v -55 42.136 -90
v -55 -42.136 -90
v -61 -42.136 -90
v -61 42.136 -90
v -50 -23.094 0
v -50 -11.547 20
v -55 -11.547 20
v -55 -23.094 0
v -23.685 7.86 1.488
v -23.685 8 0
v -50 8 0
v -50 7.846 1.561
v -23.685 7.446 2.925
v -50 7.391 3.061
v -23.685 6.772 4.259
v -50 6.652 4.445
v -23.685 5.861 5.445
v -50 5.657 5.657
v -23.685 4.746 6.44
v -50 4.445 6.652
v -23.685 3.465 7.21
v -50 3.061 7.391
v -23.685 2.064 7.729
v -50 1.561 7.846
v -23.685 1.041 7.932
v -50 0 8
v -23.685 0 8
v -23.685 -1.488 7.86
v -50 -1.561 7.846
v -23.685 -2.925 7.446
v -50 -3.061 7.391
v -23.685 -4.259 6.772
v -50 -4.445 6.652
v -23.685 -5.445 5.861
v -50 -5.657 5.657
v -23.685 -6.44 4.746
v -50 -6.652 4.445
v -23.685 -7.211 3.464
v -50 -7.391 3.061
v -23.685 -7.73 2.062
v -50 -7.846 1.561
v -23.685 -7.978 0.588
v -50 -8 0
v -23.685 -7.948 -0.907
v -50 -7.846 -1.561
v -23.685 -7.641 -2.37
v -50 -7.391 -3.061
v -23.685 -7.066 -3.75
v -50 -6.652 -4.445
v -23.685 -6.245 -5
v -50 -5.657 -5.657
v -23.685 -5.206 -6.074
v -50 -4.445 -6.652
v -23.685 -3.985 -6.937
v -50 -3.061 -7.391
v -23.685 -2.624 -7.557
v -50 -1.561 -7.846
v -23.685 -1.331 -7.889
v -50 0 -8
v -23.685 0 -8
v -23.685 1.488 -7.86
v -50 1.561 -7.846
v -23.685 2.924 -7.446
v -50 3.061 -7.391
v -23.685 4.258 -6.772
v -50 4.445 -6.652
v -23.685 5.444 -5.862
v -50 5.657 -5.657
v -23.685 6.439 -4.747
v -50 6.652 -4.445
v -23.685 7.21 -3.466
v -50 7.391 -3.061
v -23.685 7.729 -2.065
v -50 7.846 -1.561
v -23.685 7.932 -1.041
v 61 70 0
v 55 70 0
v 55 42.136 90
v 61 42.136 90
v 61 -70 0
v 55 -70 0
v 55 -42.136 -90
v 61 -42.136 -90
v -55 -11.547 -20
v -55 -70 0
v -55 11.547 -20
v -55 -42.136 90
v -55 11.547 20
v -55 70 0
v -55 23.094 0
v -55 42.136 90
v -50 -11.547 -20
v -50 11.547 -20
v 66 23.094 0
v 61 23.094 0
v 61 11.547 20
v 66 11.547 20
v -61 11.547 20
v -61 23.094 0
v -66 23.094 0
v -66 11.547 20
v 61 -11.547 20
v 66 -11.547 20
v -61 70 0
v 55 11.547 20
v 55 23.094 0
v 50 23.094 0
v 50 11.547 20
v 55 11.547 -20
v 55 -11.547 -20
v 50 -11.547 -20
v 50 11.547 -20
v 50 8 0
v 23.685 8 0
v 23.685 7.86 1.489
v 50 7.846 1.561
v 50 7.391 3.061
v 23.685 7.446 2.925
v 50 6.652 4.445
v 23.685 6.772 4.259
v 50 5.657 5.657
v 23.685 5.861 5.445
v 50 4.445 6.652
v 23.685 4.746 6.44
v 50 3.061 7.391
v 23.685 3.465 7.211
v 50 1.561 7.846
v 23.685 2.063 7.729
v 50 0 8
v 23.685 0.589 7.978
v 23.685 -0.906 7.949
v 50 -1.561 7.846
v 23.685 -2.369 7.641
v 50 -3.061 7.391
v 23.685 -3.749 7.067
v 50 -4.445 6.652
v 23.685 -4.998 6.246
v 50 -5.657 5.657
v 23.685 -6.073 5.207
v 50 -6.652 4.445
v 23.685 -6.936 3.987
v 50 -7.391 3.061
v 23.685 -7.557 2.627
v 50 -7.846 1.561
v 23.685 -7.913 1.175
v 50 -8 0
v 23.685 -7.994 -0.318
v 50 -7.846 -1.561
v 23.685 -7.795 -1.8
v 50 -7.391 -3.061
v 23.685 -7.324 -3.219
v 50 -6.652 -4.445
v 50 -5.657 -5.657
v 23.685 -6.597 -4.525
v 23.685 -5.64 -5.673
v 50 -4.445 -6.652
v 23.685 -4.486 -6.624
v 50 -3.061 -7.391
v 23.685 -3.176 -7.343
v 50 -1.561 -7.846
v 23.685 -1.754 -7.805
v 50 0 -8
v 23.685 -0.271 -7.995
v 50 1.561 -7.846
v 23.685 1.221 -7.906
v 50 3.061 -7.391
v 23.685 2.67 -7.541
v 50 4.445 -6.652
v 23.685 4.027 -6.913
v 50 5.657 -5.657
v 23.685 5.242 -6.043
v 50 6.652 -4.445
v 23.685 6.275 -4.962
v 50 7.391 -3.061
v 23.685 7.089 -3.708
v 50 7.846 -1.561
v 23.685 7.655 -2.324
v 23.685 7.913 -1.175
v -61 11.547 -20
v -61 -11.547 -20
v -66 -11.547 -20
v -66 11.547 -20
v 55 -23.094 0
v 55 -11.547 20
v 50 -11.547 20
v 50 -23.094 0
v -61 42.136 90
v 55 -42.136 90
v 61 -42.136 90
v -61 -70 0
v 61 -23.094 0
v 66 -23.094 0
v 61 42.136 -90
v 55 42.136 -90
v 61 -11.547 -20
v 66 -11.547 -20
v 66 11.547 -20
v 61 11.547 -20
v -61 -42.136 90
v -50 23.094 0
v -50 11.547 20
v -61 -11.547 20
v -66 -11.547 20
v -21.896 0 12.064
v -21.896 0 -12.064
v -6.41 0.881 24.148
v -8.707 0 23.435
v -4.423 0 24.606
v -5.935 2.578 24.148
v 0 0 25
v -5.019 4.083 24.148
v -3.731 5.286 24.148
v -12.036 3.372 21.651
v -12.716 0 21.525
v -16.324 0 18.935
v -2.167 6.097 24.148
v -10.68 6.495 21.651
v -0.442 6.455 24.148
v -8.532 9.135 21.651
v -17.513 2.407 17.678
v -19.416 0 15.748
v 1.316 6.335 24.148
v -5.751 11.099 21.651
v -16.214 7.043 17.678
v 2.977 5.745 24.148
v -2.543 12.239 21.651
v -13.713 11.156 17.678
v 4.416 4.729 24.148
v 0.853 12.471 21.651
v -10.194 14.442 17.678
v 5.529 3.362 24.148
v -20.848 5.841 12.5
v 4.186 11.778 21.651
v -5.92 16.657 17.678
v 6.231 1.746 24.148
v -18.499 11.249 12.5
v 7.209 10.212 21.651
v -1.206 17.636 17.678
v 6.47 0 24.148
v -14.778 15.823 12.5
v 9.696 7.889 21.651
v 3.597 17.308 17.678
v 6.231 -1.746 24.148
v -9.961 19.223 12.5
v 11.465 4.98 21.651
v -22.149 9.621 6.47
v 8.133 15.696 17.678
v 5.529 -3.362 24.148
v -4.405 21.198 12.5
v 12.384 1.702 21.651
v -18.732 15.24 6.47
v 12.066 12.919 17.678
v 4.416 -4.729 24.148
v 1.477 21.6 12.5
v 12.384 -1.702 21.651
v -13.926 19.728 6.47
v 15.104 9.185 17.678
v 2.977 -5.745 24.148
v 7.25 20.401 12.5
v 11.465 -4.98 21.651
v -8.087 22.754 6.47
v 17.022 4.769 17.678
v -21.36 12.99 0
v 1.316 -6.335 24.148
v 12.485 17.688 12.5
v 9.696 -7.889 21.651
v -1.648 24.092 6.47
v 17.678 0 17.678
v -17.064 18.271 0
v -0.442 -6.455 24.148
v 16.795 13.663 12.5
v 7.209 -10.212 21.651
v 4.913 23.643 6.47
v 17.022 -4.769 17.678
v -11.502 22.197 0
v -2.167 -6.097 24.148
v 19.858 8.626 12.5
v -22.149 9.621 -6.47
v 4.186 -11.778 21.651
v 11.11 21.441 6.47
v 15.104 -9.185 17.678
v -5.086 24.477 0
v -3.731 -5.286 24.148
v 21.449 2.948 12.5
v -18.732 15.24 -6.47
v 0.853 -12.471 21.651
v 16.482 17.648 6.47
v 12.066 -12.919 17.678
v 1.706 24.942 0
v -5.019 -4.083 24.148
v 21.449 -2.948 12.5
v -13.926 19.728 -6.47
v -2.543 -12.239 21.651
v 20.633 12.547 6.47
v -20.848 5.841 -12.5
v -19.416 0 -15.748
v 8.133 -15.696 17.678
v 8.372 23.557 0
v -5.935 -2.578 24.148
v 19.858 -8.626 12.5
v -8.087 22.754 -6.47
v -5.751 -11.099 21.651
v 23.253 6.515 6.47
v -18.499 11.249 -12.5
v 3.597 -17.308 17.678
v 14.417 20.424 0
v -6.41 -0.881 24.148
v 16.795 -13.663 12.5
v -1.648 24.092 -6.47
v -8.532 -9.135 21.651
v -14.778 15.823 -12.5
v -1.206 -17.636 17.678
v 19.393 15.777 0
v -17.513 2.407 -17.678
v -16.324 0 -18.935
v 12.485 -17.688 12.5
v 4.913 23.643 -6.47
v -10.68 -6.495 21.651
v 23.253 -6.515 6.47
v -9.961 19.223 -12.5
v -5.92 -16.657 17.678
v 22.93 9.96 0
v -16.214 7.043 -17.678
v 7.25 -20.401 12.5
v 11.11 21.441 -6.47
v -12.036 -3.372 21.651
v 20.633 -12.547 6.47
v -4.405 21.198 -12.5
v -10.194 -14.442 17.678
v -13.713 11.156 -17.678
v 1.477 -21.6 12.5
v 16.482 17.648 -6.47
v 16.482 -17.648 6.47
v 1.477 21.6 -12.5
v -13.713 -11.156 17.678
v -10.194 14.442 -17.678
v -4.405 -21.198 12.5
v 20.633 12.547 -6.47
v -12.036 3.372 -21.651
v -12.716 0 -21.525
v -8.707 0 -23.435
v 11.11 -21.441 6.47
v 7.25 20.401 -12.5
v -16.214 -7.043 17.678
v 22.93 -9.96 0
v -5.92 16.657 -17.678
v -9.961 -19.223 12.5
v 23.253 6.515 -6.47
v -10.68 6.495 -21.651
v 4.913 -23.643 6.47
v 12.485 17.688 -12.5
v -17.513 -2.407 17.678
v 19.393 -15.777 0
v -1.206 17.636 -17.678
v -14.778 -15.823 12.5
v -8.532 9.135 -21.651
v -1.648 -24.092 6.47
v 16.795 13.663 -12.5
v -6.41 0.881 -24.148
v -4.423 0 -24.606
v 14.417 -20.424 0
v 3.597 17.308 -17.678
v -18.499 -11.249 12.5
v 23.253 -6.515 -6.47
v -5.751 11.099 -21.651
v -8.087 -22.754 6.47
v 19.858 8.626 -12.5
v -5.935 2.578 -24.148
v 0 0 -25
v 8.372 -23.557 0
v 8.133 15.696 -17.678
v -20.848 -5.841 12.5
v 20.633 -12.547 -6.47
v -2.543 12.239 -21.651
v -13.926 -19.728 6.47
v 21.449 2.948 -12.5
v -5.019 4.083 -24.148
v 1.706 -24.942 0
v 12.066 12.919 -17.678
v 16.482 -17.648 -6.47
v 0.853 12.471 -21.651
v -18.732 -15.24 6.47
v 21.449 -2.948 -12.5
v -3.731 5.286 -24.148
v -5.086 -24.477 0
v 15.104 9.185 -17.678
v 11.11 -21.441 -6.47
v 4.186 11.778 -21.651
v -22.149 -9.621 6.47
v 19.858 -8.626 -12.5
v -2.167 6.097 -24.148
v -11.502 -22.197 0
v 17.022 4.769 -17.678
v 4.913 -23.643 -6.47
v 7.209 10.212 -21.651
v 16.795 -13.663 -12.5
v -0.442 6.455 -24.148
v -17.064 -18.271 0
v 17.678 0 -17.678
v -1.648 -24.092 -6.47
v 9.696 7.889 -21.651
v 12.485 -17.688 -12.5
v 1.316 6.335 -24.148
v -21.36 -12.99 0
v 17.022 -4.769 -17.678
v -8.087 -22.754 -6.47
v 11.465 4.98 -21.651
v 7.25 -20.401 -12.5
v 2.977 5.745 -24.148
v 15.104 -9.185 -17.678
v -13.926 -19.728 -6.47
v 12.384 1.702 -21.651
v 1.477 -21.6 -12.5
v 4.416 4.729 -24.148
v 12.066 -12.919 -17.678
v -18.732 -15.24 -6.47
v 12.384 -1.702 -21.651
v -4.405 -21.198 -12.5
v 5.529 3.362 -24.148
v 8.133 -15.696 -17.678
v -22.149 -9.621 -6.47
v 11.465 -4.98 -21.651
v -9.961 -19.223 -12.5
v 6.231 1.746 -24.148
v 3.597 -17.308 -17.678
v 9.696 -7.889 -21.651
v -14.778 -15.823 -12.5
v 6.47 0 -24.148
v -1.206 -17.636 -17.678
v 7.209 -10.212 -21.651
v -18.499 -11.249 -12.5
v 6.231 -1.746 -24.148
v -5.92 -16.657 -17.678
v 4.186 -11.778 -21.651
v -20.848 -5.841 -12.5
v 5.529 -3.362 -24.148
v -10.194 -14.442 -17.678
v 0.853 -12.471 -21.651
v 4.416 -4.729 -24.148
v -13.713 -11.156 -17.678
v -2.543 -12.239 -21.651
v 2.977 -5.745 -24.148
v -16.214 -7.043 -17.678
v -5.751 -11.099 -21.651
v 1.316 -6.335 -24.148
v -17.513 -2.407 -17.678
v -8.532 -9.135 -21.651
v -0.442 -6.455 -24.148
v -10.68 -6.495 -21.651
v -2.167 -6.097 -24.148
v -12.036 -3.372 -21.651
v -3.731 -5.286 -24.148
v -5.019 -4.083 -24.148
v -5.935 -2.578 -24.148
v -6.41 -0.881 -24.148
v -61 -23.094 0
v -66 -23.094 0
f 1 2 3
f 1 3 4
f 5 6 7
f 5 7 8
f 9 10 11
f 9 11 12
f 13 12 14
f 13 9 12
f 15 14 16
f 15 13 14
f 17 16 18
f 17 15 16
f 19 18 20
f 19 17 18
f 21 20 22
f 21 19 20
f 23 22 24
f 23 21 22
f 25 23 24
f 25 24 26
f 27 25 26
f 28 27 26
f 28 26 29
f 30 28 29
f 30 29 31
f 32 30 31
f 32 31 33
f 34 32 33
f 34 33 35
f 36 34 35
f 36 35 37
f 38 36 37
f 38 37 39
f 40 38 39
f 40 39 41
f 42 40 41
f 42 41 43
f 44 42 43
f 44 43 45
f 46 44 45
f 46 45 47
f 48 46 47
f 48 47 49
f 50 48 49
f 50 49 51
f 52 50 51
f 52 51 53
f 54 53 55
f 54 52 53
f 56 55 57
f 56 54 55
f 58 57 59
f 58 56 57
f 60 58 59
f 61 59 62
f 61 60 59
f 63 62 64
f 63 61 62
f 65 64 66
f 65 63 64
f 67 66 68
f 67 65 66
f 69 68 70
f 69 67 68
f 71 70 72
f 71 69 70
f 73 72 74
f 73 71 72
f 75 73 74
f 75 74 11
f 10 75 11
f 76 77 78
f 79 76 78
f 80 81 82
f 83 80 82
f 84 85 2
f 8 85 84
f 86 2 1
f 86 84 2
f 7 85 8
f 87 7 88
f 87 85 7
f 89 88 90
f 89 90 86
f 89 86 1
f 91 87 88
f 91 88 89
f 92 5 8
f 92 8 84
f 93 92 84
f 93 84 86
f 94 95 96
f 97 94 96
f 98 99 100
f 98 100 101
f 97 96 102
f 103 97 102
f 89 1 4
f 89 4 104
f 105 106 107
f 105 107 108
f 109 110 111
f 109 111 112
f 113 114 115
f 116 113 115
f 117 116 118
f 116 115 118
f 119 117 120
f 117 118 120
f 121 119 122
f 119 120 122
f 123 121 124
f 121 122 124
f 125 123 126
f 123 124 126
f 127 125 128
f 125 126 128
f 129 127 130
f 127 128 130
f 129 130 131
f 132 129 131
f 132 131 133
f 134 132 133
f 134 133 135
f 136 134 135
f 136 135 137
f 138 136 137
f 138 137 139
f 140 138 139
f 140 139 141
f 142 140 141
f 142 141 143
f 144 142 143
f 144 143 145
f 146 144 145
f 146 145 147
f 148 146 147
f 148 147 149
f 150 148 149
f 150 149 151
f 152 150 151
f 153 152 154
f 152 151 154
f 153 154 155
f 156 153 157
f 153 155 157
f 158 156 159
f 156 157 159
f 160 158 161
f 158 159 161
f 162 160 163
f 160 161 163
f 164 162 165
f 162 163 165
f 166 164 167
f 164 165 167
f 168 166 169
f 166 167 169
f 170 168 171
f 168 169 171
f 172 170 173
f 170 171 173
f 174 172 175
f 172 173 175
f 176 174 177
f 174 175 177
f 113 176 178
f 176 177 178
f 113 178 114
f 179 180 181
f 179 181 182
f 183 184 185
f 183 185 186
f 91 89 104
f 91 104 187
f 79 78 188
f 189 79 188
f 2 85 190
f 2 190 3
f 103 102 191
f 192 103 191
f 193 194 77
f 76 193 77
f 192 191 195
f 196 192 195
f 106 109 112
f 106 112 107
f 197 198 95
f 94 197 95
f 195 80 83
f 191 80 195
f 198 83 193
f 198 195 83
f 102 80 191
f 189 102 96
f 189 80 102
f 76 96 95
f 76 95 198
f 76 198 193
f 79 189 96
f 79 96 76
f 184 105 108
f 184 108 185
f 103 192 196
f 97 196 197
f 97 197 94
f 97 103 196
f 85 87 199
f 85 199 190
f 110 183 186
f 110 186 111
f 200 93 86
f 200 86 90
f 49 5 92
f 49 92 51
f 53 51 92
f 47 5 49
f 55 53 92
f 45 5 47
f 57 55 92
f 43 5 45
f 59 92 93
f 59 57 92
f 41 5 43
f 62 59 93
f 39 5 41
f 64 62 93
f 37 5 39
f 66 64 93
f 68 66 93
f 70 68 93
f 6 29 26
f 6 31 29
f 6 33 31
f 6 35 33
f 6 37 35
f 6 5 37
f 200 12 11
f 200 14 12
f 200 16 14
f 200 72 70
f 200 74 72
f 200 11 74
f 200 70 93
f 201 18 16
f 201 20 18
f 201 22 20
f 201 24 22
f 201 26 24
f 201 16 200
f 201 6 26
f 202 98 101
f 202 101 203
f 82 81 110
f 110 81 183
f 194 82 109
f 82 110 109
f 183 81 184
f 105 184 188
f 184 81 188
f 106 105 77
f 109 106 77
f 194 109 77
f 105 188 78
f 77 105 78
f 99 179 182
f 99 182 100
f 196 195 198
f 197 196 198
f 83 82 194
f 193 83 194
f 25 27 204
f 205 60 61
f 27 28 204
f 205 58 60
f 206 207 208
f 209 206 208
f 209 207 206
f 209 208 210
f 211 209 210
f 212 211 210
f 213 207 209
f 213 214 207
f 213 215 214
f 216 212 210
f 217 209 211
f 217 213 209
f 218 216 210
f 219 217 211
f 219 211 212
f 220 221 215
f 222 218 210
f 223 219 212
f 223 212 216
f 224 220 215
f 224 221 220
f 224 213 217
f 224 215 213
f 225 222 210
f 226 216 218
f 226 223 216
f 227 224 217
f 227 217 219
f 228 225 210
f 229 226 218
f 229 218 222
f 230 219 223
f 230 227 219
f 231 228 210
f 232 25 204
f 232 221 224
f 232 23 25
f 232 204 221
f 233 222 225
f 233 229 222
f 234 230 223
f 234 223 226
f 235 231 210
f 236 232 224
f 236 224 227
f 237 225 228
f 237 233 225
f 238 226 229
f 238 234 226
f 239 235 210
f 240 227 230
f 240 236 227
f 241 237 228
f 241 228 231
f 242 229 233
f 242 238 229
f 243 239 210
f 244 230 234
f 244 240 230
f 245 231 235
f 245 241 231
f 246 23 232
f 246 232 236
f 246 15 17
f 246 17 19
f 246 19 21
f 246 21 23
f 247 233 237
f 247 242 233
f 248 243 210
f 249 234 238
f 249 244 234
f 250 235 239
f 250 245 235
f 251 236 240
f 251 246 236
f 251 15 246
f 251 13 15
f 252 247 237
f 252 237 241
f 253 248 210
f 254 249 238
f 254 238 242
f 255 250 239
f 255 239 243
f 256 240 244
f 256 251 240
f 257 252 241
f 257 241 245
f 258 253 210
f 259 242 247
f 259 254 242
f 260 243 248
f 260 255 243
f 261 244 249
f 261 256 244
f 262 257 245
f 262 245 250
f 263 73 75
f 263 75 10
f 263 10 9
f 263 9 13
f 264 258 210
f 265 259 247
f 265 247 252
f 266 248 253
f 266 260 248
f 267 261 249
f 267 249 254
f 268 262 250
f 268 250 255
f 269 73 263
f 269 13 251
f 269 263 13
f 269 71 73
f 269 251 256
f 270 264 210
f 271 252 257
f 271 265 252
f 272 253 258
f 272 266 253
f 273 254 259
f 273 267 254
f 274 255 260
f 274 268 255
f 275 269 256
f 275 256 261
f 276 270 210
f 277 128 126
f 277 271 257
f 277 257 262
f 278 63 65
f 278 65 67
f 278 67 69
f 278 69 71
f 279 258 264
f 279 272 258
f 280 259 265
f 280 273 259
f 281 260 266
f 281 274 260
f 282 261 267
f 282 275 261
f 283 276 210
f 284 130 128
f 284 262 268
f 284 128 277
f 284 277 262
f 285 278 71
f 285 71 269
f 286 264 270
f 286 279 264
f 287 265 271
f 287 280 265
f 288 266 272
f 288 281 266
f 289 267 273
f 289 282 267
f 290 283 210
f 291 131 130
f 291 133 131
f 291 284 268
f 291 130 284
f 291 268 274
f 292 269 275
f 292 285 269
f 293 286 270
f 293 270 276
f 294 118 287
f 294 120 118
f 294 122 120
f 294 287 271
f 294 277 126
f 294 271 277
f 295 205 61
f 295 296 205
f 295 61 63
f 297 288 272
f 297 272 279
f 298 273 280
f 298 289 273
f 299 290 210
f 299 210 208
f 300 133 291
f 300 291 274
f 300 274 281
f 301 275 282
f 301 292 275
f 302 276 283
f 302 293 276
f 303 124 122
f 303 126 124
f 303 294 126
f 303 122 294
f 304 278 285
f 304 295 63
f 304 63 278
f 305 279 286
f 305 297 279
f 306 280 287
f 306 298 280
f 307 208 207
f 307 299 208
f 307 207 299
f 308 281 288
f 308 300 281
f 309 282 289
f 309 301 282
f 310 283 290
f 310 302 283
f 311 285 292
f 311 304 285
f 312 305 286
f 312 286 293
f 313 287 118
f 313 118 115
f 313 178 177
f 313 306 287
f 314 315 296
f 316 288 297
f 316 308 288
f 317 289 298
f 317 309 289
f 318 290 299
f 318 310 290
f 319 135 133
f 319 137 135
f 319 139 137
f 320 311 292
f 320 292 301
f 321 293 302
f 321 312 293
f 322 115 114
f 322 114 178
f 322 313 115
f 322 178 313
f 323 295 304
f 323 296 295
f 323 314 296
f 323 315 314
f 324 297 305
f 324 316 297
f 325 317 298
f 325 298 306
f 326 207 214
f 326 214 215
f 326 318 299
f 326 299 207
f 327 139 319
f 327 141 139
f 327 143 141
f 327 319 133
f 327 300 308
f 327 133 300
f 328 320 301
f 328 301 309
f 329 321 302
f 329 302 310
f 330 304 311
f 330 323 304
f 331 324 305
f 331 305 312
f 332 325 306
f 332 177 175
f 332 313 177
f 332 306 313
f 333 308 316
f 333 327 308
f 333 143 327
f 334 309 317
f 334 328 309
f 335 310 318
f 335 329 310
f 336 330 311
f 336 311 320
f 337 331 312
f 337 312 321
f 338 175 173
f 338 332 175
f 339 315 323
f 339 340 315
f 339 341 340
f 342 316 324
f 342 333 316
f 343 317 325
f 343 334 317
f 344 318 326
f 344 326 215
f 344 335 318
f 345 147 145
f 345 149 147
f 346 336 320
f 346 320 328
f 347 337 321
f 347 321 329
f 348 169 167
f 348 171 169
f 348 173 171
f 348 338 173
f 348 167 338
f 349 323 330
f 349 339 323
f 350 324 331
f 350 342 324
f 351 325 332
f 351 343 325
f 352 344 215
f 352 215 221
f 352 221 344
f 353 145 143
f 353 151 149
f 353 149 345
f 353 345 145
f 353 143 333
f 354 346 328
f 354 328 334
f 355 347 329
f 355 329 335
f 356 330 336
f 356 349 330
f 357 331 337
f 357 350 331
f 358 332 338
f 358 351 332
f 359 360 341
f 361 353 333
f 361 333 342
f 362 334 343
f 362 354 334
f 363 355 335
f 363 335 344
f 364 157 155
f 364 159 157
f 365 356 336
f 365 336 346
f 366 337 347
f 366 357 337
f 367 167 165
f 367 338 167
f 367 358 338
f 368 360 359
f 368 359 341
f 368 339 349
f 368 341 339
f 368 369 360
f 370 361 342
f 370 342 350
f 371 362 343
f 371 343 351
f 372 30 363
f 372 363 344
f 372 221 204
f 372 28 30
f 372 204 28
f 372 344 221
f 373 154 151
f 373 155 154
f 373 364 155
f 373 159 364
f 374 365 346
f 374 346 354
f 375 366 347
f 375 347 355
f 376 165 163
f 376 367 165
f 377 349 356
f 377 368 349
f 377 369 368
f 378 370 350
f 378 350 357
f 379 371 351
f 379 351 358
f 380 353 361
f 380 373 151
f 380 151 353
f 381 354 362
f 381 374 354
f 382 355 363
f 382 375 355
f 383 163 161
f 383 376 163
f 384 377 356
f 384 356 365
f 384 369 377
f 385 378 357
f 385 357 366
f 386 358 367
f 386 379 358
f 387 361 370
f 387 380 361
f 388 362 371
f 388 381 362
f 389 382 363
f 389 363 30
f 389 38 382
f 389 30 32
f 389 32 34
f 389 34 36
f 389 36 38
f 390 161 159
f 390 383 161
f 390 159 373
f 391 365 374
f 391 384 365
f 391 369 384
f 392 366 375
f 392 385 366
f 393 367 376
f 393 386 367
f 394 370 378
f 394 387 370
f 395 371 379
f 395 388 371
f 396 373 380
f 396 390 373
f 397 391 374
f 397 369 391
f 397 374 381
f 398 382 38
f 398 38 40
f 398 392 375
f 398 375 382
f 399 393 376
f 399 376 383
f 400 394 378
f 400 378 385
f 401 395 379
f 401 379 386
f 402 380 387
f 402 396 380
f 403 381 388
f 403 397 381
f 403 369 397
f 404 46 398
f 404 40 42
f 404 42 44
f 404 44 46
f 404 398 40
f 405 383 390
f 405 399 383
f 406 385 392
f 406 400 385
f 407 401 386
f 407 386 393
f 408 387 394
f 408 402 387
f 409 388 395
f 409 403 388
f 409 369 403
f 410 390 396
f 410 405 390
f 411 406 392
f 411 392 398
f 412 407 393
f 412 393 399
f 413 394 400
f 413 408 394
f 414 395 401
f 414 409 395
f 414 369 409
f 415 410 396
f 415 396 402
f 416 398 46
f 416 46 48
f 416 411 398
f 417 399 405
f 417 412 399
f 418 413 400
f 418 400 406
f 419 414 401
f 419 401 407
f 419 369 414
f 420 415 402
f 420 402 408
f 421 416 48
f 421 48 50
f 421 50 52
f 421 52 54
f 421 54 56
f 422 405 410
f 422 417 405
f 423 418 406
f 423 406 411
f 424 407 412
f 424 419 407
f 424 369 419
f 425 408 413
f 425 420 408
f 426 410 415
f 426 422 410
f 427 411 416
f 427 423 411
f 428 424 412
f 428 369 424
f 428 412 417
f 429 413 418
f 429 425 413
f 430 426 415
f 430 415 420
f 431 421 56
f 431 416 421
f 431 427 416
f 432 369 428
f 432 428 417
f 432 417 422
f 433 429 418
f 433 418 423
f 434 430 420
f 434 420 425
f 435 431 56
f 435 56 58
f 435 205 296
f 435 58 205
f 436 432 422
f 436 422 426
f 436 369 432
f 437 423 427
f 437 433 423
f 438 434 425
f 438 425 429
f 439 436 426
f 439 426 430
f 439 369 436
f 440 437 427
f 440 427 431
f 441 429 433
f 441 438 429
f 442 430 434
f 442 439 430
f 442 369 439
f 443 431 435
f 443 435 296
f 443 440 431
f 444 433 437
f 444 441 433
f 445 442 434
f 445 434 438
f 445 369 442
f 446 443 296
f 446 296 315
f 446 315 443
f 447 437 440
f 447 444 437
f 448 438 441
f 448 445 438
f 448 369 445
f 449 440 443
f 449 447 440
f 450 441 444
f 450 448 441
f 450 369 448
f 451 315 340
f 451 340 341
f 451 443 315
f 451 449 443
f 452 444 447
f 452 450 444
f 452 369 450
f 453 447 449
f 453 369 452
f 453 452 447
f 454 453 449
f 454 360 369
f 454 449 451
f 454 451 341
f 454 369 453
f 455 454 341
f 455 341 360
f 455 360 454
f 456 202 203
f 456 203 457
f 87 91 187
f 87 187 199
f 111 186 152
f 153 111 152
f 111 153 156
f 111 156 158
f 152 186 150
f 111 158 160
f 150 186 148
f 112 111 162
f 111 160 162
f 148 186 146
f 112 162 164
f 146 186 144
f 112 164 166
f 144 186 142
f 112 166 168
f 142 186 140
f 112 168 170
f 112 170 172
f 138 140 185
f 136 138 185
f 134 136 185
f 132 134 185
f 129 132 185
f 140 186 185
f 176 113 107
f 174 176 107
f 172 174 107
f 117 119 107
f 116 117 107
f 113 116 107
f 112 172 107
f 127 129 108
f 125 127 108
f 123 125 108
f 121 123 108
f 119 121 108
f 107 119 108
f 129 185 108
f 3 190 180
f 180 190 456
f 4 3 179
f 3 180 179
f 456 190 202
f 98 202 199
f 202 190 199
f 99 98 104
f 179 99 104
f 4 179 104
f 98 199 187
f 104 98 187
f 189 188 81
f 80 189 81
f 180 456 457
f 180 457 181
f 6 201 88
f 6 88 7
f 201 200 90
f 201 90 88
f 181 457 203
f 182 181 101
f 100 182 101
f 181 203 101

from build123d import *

# Parameters (mm, degrees)
F2_R          = 8
F3_DEPTH      = 55
F5_DEPTH      = 6
F7_DEPTH      = 5
F7_DEPTH_BACK = 11


# Not quite as in the source:
# - a pattern or mirror of a feature is missing from the dataset's text; its kind, count and spacing are read off the source's solid


with BuildPart() as f1:
    # F0 (on Front) → F1 (revolve)
    with BuildSketch(Plane.XZ):
        with BuildLine():
            Line((0, -25), (0, 25))
            ThreePointArc((0, 25), (-25, 0), (0, -25))
        make_face()
    revolve(axis=Axis((0, 0, 0), (0, 0, -1)))

    # F2 (on Right) → F3 (join)
    with BuildSketch(Plane.YZ):
        Circle(F2_R)
    f3 = extrude(amount=F3_DEPTH)

    # F3_copies: F3 across plane
    add(f3.mirror(Plane(origin=(0, 0, 0), x_dir=(0, 0, -1), z_dir=(-1, 0, 0))))

    # F4 (on face) → F5 (join)
    with BuildSketch(Plane.YZ.offset(55)):
        Polygon((-42.1359225246, 90), (-70, 0), (-42.1359225246, -90), (42.1359225246, -90), (70, 0), (42.1359225246, 90), align=None)
    f5 = extrude(amount=F5_DEPTH)

    # F5_copies: F5 across plane
    add(f5.mirror(Plane(origin=(0, 0, 0), x_dir=(0, 0, -1), z_dir=(-1, 0, 0))))

    # F6 (on face) → F7 (join, two sides)
    with BuildSketch(Plane.YZ.offset(61)) as f7_sk:
        Polygon((-11.5470053838, -20), (11.5470053838, -20), (23.0940107676, 0), (11.5470053838, 20), (-11.5470053838, 20), (-23.0940107676, 0), align=None)
    f7 = extrude(amount=F7_DEPTH) + extrude(f7_sk.sketch, amount=-F7_DEPTH_BACK)

    # F7_copies: F7 across plane
    add(f7.mirror(Plane(origin=(0, 0, 0), x_dir=(0, 0, -1), z_dir=(-1, 0, 0))))


solid = f1.part
